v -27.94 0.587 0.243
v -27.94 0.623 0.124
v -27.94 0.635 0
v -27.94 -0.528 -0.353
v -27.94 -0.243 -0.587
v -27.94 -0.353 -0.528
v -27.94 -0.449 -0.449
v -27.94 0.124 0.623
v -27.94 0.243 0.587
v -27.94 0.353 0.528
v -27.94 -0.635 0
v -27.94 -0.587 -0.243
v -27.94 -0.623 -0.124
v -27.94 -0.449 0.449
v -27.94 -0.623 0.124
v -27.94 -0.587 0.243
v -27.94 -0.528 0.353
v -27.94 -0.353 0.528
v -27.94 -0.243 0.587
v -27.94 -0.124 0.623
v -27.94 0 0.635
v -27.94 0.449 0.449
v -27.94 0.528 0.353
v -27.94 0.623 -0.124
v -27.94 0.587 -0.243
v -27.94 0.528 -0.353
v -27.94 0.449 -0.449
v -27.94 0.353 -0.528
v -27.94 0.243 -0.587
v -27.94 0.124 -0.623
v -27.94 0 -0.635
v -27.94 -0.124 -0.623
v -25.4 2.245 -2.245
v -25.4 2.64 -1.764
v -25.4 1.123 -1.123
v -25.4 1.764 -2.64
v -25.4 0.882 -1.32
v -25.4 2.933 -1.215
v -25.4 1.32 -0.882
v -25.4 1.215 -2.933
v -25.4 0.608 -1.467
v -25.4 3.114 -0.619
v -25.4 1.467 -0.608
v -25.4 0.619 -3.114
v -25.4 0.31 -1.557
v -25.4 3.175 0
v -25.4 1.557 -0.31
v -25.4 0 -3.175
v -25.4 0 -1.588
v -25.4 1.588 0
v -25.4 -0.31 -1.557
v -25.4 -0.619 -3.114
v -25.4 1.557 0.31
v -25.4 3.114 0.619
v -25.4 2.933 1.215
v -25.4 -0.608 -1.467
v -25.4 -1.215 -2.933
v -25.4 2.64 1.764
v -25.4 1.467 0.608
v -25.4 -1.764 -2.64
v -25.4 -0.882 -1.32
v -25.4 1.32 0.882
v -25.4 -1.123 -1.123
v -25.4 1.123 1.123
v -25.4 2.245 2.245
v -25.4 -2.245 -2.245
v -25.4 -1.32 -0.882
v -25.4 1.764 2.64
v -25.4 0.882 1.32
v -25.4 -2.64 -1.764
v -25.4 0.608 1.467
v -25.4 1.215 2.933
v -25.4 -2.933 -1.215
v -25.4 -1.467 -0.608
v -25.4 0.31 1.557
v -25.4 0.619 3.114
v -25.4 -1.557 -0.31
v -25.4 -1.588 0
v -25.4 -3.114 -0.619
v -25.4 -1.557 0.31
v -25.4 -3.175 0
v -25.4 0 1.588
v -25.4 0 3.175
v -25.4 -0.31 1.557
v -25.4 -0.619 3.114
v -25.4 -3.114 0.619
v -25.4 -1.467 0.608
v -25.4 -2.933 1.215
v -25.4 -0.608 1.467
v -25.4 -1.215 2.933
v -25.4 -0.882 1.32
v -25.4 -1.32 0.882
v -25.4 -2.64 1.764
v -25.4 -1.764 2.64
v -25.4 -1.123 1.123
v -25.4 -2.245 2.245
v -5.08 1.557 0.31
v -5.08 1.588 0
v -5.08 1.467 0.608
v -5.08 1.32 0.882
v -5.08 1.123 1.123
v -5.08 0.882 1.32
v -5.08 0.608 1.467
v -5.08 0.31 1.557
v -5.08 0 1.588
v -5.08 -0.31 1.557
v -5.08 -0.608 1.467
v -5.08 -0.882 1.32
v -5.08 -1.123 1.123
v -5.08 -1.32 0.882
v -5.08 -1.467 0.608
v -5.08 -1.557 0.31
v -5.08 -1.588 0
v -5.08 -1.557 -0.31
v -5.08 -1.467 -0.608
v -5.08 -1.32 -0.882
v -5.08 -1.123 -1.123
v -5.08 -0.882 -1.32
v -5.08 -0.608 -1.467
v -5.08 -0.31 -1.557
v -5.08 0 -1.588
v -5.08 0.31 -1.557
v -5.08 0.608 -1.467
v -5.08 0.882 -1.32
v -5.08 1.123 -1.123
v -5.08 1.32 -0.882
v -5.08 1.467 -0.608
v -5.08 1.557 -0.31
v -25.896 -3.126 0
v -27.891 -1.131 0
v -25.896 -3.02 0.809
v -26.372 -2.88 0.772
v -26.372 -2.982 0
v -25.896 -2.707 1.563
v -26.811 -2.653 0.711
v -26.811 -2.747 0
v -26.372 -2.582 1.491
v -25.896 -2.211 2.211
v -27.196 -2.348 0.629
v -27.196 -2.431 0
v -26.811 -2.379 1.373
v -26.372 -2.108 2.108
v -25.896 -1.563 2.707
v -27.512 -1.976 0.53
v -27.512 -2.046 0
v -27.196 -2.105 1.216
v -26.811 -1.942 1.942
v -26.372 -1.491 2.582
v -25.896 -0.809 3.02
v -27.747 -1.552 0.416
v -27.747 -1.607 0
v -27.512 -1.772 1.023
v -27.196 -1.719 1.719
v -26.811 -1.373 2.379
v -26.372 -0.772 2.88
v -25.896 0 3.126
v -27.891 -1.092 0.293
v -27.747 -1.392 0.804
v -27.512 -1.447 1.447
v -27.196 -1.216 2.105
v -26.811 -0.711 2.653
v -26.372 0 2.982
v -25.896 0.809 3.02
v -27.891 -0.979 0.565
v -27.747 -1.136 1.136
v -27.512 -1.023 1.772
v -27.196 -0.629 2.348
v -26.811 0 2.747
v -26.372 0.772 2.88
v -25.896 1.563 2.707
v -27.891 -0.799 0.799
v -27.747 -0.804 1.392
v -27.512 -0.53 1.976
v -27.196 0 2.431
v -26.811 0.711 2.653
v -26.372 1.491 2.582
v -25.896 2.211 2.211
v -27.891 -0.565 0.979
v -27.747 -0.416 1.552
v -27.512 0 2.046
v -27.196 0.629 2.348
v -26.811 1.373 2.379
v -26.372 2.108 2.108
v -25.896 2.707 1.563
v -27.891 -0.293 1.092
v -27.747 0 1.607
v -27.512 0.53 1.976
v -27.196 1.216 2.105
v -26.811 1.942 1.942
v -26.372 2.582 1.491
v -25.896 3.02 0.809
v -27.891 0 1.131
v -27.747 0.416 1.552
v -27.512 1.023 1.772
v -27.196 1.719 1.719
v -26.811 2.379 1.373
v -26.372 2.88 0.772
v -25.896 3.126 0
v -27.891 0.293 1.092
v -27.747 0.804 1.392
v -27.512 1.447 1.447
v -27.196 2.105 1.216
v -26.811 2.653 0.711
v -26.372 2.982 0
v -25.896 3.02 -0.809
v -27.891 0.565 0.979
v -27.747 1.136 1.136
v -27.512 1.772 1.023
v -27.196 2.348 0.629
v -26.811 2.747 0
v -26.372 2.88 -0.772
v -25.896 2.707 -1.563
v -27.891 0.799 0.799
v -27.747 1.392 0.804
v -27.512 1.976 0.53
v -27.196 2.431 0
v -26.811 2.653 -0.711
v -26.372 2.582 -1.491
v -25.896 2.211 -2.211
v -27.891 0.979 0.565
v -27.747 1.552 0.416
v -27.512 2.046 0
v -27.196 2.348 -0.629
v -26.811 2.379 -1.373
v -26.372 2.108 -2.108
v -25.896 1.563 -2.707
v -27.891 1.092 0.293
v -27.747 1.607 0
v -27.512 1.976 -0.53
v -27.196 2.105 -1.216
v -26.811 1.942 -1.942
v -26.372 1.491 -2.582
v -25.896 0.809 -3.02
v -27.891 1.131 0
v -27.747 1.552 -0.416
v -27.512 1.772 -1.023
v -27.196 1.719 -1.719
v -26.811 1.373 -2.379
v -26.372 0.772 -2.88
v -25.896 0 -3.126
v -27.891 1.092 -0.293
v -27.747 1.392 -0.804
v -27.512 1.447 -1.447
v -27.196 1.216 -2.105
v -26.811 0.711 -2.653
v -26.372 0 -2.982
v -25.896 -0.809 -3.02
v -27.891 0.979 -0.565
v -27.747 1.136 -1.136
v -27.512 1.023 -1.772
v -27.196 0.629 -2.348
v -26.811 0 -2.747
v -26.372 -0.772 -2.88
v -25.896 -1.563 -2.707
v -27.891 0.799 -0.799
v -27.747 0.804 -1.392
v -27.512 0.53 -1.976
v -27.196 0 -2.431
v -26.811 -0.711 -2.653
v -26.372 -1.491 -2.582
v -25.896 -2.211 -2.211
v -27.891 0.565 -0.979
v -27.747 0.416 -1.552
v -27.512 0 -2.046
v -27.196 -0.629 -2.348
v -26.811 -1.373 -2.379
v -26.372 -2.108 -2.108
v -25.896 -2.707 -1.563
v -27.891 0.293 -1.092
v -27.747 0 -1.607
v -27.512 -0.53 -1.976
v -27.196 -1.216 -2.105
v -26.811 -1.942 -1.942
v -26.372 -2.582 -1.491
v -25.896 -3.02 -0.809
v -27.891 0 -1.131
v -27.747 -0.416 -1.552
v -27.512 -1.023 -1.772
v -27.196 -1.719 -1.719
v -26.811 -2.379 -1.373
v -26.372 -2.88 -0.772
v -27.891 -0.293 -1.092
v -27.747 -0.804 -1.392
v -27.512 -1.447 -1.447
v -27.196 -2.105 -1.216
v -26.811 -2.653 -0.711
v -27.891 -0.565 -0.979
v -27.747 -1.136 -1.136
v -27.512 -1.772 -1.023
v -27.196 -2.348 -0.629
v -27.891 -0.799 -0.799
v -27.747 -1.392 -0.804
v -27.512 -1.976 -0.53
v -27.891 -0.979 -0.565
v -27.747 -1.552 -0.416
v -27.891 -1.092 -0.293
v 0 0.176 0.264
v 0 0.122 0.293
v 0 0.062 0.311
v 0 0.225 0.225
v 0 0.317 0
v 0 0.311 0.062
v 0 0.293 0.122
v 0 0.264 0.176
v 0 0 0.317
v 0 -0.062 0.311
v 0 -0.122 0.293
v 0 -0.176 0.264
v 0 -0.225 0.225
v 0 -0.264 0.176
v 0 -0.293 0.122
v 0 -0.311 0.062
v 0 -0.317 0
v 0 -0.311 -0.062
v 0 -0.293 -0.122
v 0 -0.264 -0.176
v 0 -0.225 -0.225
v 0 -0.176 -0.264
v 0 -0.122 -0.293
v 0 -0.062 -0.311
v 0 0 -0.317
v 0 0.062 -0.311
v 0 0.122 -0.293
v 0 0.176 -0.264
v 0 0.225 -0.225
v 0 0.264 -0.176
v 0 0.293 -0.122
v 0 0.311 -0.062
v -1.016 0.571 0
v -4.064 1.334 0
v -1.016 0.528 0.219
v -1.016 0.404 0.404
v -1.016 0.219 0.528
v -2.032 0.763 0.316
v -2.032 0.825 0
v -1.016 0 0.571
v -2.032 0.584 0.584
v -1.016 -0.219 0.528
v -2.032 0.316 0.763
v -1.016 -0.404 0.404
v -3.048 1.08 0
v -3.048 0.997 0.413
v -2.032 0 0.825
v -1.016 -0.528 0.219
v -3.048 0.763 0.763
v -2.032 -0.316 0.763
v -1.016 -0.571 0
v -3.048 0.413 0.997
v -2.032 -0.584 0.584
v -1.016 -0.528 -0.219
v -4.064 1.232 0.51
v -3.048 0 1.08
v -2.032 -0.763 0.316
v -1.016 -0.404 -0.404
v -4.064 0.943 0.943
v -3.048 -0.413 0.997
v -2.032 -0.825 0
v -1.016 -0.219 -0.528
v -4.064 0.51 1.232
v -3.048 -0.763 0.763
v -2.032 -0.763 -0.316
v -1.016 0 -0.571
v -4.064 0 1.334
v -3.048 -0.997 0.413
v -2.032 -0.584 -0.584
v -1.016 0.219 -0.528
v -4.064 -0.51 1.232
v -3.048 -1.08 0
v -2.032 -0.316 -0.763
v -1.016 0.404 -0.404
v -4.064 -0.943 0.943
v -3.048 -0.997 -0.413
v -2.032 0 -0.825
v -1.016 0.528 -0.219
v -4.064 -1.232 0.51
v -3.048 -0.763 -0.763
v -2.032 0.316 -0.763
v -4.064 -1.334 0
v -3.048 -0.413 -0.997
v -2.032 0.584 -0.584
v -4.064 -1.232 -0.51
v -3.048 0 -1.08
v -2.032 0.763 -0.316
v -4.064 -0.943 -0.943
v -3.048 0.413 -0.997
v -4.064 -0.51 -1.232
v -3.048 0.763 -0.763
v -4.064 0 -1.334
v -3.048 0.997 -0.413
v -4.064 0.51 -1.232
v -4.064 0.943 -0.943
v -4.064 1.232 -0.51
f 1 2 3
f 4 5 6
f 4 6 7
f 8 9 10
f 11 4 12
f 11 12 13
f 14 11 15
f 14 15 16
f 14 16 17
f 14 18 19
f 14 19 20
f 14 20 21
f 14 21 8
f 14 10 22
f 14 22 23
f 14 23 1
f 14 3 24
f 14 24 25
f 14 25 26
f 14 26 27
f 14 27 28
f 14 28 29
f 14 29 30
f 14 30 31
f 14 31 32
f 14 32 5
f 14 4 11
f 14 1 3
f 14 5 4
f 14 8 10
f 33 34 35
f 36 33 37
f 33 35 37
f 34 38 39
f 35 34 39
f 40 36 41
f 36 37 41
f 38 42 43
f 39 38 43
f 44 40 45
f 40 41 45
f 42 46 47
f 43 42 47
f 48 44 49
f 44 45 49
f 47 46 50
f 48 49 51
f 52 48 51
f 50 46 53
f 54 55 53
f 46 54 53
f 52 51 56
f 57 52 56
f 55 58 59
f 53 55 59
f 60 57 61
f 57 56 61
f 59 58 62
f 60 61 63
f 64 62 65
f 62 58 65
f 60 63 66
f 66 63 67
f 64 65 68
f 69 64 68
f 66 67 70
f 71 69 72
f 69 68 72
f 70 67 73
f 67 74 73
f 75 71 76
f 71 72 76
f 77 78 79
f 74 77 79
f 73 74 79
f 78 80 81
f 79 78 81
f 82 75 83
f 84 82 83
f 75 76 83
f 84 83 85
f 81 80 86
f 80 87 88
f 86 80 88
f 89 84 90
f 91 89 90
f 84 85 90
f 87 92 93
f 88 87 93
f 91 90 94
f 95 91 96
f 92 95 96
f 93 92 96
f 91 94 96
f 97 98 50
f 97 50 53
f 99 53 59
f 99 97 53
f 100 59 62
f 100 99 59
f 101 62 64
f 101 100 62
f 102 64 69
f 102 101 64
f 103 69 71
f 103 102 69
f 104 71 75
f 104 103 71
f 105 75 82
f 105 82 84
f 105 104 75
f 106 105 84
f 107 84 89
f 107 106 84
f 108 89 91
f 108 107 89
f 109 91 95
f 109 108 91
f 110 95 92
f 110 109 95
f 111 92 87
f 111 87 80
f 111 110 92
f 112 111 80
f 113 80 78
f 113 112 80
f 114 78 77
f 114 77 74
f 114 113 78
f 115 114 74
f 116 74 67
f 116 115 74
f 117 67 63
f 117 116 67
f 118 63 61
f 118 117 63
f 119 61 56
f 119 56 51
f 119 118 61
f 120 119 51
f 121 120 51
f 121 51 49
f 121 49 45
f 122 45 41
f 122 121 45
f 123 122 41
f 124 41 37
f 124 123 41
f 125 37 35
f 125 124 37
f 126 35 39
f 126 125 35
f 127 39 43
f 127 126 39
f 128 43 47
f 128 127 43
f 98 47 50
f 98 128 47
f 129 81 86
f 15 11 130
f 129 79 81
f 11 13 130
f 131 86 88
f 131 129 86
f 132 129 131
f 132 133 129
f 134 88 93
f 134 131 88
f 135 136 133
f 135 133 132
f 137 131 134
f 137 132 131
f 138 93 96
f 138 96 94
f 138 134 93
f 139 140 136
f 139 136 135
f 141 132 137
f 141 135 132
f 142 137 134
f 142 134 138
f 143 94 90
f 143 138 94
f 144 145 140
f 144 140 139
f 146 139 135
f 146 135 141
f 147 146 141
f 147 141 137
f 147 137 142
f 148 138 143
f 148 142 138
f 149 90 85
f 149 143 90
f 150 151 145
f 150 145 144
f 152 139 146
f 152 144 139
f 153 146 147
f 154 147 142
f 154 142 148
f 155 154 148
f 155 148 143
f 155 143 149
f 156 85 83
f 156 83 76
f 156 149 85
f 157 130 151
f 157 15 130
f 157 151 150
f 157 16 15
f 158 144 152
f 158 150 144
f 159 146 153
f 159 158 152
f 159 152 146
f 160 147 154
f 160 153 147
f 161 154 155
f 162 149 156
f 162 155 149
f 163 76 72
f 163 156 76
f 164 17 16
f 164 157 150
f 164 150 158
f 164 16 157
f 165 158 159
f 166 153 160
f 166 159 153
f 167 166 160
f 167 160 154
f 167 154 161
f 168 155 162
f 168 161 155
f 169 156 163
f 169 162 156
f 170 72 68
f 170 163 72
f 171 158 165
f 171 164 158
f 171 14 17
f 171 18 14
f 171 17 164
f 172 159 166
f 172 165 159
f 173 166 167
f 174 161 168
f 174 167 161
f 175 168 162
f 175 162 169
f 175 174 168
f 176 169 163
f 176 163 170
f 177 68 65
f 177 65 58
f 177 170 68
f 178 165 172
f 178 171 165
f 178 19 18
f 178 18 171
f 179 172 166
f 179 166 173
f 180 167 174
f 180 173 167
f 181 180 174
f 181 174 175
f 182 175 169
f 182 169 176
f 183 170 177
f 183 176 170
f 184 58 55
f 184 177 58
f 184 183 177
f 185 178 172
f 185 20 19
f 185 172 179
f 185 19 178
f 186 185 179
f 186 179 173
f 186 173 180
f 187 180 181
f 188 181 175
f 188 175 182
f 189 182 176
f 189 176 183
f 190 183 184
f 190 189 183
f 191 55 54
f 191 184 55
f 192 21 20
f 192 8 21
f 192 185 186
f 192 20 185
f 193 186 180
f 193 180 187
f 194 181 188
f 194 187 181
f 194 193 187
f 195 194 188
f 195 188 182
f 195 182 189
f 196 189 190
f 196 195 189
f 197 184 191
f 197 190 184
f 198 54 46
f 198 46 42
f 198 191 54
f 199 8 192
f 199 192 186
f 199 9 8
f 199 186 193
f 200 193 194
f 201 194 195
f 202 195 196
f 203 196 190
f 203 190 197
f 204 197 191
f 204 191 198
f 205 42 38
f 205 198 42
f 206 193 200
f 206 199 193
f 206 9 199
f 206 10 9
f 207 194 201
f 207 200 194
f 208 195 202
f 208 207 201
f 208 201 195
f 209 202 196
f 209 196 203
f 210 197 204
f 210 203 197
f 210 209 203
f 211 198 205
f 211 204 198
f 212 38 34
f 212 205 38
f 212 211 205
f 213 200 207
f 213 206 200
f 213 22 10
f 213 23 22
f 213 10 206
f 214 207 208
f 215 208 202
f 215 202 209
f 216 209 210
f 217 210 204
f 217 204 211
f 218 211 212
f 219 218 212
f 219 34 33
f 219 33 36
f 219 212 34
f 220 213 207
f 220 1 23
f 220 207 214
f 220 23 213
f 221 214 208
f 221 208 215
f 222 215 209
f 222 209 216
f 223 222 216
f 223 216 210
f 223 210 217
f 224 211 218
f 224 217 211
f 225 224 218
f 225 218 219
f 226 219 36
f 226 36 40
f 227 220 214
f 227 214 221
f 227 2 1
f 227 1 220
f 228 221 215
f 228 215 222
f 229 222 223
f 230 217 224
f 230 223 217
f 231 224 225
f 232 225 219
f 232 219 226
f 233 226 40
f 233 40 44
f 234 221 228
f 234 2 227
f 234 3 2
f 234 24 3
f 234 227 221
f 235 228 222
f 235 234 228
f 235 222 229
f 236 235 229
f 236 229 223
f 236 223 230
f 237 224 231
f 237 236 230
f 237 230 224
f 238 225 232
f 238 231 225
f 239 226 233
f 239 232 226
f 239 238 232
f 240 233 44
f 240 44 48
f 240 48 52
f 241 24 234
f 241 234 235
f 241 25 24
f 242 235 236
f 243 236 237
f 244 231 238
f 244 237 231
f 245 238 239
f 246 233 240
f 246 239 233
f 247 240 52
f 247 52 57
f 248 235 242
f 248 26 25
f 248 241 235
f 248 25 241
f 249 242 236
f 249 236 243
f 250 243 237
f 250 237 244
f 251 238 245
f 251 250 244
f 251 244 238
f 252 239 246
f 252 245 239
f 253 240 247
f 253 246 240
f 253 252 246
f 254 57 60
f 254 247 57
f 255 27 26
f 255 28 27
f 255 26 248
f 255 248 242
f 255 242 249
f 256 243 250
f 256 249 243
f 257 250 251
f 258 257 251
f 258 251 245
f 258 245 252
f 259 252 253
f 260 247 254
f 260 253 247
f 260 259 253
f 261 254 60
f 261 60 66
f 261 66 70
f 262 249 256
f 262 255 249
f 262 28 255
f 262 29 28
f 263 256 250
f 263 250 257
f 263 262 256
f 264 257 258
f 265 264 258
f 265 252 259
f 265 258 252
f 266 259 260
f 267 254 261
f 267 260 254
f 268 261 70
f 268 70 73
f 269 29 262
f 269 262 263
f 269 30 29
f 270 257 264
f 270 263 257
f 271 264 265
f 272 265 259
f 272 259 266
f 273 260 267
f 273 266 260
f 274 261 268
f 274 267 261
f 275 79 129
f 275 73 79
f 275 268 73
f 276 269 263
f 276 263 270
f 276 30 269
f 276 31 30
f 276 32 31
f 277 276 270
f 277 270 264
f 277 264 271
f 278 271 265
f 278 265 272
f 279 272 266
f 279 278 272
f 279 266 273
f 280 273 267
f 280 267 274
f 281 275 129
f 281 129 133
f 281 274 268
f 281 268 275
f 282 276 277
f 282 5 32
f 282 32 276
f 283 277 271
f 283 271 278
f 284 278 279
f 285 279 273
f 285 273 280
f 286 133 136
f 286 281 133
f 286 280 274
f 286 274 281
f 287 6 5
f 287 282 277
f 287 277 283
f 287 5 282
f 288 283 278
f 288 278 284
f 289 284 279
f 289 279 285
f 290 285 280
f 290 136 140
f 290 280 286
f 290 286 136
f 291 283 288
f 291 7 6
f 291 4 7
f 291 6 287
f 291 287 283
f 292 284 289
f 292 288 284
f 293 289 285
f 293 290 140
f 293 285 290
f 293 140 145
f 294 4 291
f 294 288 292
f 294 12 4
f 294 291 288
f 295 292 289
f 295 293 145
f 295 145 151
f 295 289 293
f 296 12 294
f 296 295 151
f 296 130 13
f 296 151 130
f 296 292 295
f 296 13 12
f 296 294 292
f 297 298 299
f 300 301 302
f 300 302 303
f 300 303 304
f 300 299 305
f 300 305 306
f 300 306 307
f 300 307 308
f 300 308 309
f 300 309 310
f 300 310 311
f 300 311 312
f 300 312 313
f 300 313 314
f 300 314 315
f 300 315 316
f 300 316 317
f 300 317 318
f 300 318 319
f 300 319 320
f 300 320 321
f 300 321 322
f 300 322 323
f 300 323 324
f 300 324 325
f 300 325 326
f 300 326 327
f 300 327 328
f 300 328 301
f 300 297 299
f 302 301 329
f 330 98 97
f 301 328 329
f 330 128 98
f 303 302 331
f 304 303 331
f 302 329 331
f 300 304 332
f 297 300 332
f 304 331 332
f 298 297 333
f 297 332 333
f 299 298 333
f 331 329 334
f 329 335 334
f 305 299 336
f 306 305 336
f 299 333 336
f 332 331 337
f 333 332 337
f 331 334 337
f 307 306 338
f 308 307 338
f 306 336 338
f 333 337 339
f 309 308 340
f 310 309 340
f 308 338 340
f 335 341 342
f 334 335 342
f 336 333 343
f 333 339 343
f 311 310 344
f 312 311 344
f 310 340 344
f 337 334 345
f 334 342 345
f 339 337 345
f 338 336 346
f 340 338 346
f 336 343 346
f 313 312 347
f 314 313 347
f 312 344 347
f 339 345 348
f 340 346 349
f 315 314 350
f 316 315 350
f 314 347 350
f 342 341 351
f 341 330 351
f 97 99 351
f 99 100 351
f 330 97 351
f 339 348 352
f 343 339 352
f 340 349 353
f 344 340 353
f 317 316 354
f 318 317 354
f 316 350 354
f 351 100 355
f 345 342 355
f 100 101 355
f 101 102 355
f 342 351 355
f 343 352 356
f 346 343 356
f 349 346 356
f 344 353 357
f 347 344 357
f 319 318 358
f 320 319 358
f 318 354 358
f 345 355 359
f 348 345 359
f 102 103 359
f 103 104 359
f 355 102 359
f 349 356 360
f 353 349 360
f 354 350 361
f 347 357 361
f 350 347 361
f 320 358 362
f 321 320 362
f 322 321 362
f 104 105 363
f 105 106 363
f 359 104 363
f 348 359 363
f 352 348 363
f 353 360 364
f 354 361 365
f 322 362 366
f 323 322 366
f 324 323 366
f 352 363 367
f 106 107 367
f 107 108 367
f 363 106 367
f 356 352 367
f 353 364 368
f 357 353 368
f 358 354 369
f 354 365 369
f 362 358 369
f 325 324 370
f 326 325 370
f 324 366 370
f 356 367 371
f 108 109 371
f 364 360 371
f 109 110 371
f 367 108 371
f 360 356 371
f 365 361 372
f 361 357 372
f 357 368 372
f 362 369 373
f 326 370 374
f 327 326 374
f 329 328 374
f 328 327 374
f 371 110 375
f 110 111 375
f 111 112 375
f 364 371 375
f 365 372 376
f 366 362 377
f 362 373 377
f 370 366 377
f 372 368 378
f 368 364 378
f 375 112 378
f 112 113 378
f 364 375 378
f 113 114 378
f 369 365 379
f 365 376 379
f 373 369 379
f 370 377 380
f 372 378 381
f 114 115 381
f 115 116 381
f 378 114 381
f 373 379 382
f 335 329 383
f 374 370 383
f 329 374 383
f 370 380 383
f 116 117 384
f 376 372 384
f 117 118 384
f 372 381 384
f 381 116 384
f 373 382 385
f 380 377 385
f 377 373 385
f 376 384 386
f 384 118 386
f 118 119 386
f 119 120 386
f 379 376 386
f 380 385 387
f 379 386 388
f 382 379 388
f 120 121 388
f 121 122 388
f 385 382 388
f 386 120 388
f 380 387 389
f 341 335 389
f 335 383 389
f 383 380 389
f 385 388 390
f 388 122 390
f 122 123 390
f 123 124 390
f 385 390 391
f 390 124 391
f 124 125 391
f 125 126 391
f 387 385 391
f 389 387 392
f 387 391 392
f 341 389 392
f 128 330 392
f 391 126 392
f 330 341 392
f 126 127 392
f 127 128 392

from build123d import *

# Parameters (mm, degrees)
F0_R     = 1.5875
F1_DEPTH = 25.4
F2_R     = 3.175
F2_R_2   = 1.5875
F3_DEPTH = 2.54
F4_R     = 2.53999
F5_SIZE2 = 5.08
F5_SIZE  = 1.27


# Not quite as in the source:
# - a fillet or chamfer is up to 0.001 mm smaller than in the source, because OpenCascade refuses the exact size


with BuildPart() as f1:
    # F0 (on Right) → F1 (new body)
    with BuildSketch(Plane.YZ):
        Circle(F0_R)
    extrude(amount=-F1_DEPTH)

    # F2 (on face) → F3 (join)
    with BuildSketch(Plane(origin=(-25.4, 0, 0), x_dir=(0, -1, 0), z_dir=(-1, 0, 0))):
        Circle(F2_R)
        Circle(F2_R_2, mode=Mode.SUBTRACT)
        Circle(F2_R_2)
    extrude(amount=F3_DEPTH)

    # F4 (radius 2.54 in the source; OpenCascade refuses exactly that, so slightly less here)
    f4_edges = [f1.edges().sort_by_distance(p)[0] for p in [
        (-27.94, 3.175, 0),
    ]]
    fillet(f4_edges, radius=F4_R)

    # F5
    f5_edges = [f1.edges().sort_by_distance(p)[0] for p in [
        (0, -1.5875, 0),
    ]]
    f5_side = f1.faces().sort_by_distance((0, 0, 0))[0]
    chamfer(f5_edges, length=F5_SIZE, length2=F5_SIZE2, reference=f5_side)


solid = f1.part
